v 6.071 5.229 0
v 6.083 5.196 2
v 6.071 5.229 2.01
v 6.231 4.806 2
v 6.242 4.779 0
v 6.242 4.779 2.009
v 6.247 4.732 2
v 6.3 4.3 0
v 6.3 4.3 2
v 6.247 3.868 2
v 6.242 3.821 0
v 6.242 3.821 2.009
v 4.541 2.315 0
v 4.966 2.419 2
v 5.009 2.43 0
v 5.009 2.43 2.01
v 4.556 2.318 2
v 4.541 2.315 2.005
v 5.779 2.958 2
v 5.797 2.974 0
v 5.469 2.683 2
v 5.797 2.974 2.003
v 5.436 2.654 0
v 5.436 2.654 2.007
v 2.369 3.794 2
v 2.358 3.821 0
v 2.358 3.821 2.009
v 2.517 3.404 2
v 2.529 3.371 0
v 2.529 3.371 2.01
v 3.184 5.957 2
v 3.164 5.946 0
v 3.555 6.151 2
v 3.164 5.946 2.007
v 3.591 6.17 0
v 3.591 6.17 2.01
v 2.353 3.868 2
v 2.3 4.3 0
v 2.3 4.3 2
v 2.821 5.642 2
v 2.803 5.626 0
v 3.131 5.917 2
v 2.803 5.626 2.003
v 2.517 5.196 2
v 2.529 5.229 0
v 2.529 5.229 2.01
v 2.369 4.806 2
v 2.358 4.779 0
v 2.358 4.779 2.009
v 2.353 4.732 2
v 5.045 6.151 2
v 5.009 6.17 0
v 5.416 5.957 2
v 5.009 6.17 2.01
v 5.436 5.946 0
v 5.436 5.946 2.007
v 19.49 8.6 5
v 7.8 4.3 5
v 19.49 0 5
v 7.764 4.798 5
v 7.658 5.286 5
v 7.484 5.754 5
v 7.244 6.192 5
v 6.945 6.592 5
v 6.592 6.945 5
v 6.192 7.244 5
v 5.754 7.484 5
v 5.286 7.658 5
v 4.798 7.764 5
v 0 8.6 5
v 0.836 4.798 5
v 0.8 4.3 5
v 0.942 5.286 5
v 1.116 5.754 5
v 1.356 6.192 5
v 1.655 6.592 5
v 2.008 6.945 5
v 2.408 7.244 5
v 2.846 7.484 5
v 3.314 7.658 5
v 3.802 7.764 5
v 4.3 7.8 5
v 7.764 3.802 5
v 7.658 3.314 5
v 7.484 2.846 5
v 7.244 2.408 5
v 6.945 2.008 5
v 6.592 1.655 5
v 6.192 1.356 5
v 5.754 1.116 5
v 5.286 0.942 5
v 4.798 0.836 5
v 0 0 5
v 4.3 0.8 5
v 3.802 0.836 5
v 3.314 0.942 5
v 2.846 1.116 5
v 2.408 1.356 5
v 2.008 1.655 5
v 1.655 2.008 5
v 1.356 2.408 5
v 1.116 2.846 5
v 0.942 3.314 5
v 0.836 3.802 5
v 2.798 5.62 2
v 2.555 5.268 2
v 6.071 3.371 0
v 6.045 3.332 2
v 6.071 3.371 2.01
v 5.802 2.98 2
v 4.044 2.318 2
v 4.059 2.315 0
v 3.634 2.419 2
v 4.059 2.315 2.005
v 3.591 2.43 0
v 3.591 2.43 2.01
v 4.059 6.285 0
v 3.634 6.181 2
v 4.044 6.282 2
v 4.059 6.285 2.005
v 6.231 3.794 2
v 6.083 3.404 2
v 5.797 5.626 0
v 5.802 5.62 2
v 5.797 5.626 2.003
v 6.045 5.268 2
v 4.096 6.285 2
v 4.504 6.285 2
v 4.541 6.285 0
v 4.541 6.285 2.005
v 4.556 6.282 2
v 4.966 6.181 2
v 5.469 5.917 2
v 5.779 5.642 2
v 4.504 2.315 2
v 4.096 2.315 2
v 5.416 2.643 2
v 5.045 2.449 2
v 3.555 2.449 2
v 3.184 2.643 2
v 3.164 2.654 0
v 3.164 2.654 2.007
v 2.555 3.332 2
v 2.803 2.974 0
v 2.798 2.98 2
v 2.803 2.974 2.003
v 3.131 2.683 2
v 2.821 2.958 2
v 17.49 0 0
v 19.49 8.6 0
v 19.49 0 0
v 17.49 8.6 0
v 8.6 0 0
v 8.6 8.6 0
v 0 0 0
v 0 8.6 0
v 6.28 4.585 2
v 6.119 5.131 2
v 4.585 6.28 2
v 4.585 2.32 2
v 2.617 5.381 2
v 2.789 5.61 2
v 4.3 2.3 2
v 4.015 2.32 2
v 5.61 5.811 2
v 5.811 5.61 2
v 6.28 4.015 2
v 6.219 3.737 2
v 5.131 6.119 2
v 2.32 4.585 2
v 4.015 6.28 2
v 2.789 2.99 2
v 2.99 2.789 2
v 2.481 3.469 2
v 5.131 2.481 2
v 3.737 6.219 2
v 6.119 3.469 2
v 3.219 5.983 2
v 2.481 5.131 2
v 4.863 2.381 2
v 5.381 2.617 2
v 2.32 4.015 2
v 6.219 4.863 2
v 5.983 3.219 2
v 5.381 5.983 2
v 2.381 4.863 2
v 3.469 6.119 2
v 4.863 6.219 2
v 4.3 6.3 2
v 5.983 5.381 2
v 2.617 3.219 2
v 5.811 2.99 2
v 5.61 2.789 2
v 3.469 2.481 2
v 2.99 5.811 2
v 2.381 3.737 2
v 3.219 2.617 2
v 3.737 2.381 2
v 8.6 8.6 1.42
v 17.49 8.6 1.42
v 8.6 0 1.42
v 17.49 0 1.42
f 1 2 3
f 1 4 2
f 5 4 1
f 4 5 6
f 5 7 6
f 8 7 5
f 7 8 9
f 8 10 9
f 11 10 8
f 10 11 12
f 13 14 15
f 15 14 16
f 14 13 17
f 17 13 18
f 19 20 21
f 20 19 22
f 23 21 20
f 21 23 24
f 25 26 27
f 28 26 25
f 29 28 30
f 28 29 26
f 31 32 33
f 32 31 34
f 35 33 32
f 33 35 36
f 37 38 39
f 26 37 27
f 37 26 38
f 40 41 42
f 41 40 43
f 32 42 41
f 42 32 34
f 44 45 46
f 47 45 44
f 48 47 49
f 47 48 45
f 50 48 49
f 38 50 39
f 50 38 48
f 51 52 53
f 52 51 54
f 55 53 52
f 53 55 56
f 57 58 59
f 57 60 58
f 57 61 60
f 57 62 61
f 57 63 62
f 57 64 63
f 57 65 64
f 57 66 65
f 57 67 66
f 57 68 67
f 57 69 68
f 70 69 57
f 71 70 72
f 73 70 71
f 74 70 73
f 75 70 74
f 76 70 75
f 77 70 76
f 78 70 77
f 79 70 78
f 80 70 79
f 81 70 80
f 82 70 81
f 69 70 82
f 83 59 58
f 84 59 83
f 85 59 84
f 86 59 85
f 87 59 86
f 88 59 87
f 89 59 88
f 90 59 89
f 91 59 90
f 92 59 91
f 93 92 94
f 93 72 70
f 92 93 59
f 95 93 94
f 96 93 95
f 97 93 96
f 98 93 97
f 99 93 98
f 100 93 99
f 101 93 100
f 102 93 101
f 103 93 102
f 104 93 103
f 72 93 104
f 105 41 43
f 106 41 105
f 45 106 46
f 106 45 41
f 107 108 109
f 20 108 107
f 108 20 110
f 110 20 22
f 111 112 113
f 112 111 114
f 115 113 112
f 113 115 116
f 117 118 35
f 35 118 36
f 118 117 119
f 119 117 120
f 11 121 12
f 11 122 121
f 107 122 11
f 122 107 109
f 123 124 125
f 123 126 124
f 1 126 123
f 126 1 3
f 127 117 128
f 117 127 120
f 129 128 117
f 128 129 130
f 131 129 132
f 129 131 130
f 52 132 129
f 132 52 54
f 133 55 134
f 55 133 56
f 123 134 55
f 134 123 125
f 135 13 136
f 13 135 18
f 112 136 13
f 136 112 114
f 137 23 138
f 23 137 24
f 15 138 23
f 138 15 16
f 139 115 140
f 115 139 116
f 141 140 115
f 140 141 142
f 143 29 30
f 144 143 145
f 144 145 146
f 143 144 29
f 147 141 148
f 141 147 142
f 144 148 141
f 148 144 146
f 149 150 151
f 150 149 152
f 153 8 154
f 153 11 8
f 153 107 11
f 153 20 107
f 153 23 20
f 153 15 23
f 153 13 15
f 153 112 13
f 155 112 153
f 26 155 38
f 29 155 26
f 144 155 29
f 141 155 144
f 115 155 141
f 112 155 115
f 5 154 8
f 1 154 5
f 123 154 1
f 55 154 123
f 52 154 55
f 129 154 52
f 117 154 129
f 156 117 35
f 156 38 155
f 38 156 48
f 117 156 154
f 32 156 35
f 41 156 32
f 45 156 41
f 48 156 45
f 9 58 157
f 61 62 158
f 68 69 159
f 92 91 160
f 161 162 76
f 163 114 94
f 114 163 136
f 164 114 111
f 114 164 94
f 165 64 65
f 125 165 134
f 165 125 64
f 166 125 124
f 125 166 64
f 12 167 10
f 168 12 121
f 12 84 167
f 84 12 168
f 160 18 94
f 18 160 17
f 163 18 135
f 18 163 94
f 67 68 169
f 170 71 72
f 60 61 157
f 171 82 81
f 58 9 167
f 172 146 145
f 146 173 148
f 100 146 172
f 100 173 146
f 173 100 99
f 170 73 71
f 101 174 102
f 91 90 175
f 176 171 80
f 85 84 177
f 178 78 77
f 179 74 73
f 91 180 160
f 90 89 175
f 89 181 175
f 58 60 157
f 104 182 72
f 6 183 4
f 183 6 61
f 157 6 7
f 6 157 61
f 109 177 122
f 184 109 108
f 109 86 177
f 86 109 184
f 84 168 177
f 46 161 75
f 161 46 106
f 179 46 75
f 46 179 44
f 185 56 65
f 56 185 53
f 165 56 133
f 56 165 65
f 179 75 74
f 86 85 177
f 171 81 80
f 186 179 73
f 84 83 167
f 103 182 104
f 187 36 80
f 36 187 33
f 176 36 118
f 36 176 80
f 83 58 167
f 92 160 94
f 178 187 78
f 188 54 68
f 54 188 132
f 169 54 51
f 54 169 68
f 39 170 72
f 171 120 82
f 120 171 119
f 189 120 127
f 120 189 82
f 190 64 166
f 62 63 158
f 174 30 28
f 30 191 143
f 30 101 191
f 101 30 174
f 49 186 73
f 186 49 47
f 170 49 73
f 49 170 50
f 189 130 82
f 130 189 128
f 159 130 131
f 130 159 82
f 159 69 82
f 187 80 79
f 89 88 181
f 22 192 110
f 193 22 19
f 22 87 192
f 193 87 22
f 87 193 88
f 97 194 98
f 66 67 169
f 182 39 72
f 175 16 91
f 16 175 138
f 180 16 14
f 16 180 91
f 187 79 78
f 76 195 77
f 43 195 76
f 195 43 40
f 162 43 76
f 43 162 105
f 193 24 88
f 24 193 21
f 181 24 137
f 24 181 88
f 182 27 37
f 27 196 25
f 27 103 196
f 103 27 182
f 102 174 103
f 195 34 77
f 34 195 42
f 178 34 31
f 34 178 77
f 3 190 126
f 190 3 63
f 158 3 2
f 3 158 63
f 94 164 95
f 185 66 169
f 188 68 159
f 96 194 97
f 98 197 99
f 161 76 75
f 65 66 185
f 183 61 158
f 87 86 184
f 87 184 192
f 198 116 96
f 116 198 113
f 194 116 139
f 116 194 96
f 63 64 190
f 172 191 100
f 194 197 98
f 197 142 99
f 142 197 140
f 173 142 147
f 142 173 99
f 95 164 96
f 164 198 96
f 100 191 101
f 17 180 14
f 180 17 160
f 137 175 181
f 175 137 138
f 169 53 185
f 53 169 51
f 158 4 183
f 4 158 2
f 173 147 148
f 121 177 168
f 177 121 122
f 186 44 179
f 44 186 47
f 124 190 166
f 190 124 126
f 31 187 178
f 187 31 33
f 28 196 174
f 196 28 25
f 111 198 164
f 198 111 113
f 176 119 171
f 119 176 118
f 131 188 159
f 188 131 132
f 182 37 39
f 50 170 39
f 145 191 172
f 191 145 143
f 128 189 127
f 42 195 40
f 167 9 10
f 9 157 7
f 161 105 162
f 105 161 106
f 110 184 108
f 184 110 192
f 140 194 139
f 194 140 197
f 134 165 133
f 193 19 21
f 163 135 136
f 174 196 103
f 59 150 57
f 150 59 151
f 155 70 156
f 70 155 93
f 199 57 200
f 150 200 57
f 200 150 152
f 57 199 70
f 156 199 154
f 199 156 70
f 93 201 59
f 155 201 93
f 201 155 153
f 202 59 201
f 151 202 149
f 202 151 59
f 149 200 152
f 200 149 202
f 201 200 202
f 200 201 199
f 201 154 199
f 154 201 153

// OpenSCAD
//
//***Holder for Rainbow Ribbon Flat Cable***
//Designed upside to how you print it. That's why it can look like too much plastic is above the cable.
//Coded for Thingyverse / Customizer
//
// Alan Percy Childs - Mostly
// B.Norcutt - Added countersink for screw heads

//User Settings
    
    //Render it sweetly
    $fa=1; $fs=0.5;    
    
    /* [Global] */

    
    /* [Cable] */
    //No of wires in the cable
    cable_qty = 6; // [1:100]
    //In mm, unless you use milstomm func in code.
    cable_pitch = 1.27; 
    
    /* [Screw] */
    //Screw thread diameter
    screw_threadWidth = 4; 
    //Screw head width, controls overall width of holder
    screw_headWidth = 7; 
    //0 if flat, use for countersinking
    screw_headDepth = 3; 
    
    /* [3D Printer] */
    //The mm nozzle on the 3D printer (assumes wall)
    print_nozzle = 0.4; 
    //The mm layer height on the 3D printer
    print_height = 0.15; 
 

/* [Hidden] */

//Render it sweetly
    $fa=1; $fs=0.5;    
 
//Hard Calculations (lazy functions)
    
    //Cable
    cable_width = (cable_qty+1)*cable_pitch;
    cable_height = cable_pitch+print_height;
    
    //Box
    box_width = screw_headWidth+(print_nozzle*4); 
    box_edge = ceil(cable_pitch) > 2 ? ceil(cable_pitch) : 2; 
    box_height = screw_headDepth+box_edge > cable_height+box_edge ? screw_headDepth+box_edge : cable_height+box_edge;

  
//Make Parts (Modules)
      
    module cable(cable_length=0) {
        cube([ cable_width , cable_length , cable_height ]);
    }
    
    module screw() {
        cylinder( h=box_height , d=screw_threadWidth );
        //Countersink
        if (screw_headDepth > 0) {
            translate([ 0 , 0 , box_height-(screw_headDepth) ]) 
                    cylinder( d2=screw_headWidth , d1=screw_threadWidth , h=screw_headDepth );
        }
    }


//Put it together (Rendering)

    difference(){
        cube([ box_width+cable_width+box_edge , box_width , box_height ]);
        translate([ box_width , 0 , 0 ])
            cable(box_width);
        translate([ (box_width/2) , (box_width/2) , 0 ])
            screw();
    }
        

    
            
//Mathical functions (some added just in case)

//    function milstomm(mils) = (mils*2.54) / 100;
//    function awgtomm(awg) = 0.127 * pow( 92 , ((36-awg)/39) ); //this isn't pitch :-(
